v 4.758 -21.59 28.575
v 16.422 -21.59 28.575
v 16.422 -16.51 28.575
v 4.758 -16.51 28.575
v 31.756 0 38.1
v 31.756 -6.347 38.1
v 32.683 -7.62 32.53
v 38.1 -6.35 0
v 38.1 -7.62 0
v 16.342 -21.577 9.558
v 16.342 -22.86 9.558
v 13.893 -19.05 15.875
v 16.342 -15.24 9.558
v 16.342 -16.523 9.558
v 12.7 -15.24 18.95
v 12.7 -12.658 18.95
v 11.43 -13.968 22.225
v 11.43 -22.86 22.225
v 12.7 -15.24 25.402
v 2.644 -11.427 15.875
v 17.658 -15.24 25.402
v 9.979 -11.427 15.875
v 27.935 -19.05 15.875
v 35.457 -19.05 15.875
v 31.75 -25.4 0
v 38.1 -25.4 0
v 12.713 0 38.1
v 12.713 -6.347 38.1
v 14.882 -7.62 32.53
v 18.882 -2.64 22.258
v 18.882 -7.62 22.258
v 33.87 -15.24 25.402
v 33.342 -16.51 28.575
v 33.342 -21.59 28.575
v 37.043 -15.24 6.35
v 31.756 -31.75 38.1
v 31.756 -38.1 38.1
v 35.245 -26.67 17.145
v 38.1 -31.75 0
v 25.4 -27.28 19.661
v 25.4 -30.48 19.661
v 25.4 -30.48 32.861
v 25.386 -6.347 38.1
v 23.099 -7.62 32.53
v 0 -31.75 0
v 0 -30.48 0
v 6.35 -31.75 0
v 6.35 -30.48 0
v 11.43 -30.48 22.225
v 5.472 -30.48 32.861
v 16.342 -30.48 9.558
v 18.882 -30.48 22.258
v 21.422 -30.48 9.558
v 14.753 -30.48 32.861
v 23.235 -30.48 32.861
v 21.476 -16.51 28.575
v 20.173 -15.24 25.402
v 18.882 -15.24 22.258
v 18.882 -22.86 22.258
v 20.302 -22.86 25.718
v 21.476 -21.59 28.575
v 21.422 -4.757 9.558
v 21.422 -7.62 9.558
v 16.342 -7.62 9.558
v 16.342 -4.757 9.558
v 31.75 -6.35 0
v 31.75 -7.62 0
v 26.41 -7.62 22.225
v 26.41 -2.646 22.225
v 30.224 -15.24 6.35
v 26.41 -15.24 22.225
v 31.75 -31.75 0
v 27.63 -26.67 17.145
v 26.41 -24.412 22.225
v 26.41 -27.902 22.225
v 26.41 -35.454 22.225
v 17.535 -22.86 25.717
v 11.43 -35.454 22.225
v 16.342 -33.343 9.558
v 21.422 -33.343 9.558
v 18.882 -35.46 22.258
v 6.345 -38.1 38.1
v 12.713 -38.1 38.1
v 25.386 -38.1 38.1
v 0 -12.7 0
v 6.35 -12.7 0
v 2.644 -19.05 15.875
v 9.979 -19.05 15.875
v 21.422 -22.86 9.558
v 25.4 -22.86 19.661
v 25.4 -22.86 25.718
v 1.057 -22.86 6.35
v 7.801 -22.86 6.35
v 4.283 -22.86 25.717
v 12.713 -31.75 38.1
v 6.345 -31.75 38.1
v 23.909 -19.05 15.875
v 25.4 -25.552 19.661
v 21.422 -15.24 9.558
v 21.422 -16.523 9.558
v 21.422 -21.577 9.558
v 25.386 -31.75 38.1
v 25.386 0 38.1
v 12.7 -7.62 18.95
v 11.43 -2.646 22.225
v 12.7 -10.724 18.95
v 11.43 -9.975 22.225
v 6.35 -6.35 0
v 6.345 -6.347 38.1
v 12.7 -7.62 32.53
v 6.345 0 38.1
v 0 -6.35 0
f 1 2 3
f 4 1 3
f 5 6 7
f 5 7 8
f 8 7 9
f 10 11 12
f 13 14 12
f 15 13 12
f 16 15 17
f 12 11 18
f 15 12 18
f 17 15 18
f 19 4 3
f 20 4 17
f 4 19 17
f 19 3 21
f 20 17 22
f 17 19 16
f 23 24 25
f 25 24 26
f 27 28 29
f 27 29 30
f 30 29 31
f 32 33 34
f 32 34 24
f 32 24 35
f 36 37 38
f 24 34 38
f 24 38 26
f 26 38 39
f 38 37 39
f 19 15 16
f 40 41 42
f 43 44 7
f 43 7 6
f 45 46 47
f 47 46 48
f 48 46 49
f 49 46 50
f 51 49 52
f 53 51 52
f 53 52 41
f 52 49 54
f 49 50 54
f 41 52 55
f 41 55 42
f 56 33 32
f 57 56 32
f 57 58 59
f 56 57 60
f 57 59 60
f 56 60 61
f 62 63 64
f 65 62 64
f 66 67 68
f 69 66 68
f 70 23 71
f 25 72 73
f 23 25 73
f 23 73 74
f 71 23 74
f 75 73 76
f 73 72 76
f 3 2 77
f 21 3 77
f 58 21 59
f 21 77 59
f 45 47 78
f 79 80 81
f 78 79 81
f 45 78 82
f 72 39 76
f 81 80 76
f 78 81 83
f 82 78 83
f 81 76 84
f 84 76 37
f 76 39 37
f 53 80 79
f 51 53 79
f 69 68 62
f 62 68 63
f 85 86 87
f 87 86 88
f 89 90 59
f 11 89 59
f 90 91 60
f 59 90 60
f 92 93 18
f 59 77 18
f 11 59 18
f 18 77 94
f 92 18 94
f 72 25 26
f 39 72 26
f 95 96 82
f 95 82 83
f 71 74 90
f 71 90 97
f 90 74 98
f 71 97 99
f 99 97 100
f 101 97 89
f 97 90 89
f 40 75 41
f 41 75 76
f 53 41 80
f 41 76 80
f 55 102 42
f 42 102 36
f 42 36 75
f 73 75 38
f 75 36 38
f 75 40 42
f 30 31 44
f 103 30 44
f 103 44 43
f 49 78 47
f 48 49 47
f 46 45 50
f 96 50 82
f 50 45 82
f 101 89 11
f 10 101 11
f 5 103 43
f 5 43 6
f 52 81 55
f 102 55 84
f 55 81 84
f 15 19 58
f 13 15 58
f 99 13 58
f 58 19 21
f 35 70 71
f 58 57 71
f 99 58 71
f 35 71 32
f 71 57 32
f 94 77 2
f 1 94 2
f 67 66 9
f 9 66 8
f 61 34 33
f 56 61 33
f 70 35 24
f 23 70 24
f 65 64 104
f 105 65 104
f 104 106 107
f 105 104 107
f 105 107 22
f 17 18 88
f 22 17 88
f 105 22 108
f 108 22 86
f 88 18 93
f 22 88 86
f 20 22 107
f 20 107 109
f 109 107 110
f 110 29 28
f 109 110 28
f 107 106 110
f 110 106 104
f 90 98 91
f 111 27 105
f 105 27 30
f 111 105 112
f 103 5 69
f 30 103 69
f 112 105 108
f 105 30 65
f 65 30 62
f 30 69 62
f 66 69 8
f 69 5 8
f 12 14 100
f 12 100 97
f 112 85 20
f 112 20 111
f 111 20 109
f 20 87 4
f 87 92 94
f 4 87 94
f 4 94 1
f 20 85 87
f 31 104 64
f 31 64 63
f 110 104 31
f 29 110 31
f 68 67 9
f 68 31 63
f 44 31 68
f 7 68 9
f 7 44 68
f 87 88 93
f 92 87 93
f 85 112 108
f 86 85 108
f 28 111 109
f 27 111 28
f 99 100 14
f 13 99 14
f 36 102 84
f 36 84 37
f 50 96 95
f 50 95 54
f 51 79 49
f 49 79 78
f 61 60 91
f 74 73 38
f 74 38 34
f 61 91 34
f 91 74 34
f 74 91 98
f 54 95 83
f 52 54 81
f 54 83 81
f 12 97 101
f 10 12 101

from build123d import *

# Parameters (mm, degrees)
F0_W      = 38.1
F0_H      = 38.1
F1_DEPTH  = 38.1
F5_DEPTH  = 50.8
F7_DEPTH  = 127
F9_DEPTH  = 50.8
F10_W     = 25.4
F10_H     = 7.62
F11_DEPTH = 50.8


with BuildPart() as f1:
    # F0 (on Front) → F1 (new body)
    with BuildSketch(Plane.XZ):
        with Locations((19.05, 19.05)):
            Rectangle(F0_W, F0_H)
    extrude(amount=F1_DEPTH)

    # F4 (on face) → F5 (cut)
    with BuildSketch(Plane.YZ.offset(38.1)):
        Polygon((-11.4268120378, 38.1), (-31.75, 38.1), (-26.67, 17.145), (-21.59, 28.575), (-16.51, 28.575), (-11.4268120378, 15.875), (-6.3468120378, 38.1), align=None)
        Polygon((-38.1, 0), (-31.75, 0), (-38.1, 38.1), align=None)
        Polygon((-19.05, 15.875), (-25.4, 0), (-12.7, 0), align=None)
        Polygon((0, 38.1), (-6.35, 0), (0, 0), align=None)
    extrude(amount=-F5_DEPTH, mode=Mode.SUBTRACT)

    # F6 (on offset) → F7 (cut)
    with BuildSketch(Plane.XZ.offset(38.1)):
        Polygon((11.43, 22.225), (6.35, 0), (11.43, 0), (26.67, 0), (31.75, 0), (26.4095281363, 22.225), (21.4223176855, 9.558487687), (18.8823176855, 9.558487687), (16.3423176855, 9.558487687), align=None)
        Polygon((18.8823176855, 38.1), (12.7131294711, 38.1), (18.8823176855, 22.258487687), align=None)
        Polygon((25.3863393215, 38.1), (18.8823176855, 38.1), (18.8823176855, 22.258487687), align=None)
        Polygon((31.7556646041, 38.1), (38.1, 0), (38.1, 38.1), align=None)
        Polygon((0, 38.1), (0, 0), (6.3445118444, 38.1), align=None)
    extrude(amount=-F7_DEPTH, mode=Mode.SUBTRACT)

    # F8 (on offset) → F9 (cut)
    with BuildSketch(Plane.XY.offset(38.1)):
        Polygon((12.7, -22.86), (0, -22.86), (0, -30.48), (12.7, -30.48), (25.4, -30.48), (25.4, -22.86), align=None)
    extrude(amount=-F9_DEPTH, mode=Mode.SUBTRACT)

    # F10 (on offset) → F11 (cut)
    with BuildSketch(Plane.XY.offset(38.1)):
        with Locations((25.4, -11.43)):
            Rectangle(F10_W, F10_H)
    extrude(amount=-F11_DEPTH, mode=Mode.SUBTRACT)


solid = f1.part
